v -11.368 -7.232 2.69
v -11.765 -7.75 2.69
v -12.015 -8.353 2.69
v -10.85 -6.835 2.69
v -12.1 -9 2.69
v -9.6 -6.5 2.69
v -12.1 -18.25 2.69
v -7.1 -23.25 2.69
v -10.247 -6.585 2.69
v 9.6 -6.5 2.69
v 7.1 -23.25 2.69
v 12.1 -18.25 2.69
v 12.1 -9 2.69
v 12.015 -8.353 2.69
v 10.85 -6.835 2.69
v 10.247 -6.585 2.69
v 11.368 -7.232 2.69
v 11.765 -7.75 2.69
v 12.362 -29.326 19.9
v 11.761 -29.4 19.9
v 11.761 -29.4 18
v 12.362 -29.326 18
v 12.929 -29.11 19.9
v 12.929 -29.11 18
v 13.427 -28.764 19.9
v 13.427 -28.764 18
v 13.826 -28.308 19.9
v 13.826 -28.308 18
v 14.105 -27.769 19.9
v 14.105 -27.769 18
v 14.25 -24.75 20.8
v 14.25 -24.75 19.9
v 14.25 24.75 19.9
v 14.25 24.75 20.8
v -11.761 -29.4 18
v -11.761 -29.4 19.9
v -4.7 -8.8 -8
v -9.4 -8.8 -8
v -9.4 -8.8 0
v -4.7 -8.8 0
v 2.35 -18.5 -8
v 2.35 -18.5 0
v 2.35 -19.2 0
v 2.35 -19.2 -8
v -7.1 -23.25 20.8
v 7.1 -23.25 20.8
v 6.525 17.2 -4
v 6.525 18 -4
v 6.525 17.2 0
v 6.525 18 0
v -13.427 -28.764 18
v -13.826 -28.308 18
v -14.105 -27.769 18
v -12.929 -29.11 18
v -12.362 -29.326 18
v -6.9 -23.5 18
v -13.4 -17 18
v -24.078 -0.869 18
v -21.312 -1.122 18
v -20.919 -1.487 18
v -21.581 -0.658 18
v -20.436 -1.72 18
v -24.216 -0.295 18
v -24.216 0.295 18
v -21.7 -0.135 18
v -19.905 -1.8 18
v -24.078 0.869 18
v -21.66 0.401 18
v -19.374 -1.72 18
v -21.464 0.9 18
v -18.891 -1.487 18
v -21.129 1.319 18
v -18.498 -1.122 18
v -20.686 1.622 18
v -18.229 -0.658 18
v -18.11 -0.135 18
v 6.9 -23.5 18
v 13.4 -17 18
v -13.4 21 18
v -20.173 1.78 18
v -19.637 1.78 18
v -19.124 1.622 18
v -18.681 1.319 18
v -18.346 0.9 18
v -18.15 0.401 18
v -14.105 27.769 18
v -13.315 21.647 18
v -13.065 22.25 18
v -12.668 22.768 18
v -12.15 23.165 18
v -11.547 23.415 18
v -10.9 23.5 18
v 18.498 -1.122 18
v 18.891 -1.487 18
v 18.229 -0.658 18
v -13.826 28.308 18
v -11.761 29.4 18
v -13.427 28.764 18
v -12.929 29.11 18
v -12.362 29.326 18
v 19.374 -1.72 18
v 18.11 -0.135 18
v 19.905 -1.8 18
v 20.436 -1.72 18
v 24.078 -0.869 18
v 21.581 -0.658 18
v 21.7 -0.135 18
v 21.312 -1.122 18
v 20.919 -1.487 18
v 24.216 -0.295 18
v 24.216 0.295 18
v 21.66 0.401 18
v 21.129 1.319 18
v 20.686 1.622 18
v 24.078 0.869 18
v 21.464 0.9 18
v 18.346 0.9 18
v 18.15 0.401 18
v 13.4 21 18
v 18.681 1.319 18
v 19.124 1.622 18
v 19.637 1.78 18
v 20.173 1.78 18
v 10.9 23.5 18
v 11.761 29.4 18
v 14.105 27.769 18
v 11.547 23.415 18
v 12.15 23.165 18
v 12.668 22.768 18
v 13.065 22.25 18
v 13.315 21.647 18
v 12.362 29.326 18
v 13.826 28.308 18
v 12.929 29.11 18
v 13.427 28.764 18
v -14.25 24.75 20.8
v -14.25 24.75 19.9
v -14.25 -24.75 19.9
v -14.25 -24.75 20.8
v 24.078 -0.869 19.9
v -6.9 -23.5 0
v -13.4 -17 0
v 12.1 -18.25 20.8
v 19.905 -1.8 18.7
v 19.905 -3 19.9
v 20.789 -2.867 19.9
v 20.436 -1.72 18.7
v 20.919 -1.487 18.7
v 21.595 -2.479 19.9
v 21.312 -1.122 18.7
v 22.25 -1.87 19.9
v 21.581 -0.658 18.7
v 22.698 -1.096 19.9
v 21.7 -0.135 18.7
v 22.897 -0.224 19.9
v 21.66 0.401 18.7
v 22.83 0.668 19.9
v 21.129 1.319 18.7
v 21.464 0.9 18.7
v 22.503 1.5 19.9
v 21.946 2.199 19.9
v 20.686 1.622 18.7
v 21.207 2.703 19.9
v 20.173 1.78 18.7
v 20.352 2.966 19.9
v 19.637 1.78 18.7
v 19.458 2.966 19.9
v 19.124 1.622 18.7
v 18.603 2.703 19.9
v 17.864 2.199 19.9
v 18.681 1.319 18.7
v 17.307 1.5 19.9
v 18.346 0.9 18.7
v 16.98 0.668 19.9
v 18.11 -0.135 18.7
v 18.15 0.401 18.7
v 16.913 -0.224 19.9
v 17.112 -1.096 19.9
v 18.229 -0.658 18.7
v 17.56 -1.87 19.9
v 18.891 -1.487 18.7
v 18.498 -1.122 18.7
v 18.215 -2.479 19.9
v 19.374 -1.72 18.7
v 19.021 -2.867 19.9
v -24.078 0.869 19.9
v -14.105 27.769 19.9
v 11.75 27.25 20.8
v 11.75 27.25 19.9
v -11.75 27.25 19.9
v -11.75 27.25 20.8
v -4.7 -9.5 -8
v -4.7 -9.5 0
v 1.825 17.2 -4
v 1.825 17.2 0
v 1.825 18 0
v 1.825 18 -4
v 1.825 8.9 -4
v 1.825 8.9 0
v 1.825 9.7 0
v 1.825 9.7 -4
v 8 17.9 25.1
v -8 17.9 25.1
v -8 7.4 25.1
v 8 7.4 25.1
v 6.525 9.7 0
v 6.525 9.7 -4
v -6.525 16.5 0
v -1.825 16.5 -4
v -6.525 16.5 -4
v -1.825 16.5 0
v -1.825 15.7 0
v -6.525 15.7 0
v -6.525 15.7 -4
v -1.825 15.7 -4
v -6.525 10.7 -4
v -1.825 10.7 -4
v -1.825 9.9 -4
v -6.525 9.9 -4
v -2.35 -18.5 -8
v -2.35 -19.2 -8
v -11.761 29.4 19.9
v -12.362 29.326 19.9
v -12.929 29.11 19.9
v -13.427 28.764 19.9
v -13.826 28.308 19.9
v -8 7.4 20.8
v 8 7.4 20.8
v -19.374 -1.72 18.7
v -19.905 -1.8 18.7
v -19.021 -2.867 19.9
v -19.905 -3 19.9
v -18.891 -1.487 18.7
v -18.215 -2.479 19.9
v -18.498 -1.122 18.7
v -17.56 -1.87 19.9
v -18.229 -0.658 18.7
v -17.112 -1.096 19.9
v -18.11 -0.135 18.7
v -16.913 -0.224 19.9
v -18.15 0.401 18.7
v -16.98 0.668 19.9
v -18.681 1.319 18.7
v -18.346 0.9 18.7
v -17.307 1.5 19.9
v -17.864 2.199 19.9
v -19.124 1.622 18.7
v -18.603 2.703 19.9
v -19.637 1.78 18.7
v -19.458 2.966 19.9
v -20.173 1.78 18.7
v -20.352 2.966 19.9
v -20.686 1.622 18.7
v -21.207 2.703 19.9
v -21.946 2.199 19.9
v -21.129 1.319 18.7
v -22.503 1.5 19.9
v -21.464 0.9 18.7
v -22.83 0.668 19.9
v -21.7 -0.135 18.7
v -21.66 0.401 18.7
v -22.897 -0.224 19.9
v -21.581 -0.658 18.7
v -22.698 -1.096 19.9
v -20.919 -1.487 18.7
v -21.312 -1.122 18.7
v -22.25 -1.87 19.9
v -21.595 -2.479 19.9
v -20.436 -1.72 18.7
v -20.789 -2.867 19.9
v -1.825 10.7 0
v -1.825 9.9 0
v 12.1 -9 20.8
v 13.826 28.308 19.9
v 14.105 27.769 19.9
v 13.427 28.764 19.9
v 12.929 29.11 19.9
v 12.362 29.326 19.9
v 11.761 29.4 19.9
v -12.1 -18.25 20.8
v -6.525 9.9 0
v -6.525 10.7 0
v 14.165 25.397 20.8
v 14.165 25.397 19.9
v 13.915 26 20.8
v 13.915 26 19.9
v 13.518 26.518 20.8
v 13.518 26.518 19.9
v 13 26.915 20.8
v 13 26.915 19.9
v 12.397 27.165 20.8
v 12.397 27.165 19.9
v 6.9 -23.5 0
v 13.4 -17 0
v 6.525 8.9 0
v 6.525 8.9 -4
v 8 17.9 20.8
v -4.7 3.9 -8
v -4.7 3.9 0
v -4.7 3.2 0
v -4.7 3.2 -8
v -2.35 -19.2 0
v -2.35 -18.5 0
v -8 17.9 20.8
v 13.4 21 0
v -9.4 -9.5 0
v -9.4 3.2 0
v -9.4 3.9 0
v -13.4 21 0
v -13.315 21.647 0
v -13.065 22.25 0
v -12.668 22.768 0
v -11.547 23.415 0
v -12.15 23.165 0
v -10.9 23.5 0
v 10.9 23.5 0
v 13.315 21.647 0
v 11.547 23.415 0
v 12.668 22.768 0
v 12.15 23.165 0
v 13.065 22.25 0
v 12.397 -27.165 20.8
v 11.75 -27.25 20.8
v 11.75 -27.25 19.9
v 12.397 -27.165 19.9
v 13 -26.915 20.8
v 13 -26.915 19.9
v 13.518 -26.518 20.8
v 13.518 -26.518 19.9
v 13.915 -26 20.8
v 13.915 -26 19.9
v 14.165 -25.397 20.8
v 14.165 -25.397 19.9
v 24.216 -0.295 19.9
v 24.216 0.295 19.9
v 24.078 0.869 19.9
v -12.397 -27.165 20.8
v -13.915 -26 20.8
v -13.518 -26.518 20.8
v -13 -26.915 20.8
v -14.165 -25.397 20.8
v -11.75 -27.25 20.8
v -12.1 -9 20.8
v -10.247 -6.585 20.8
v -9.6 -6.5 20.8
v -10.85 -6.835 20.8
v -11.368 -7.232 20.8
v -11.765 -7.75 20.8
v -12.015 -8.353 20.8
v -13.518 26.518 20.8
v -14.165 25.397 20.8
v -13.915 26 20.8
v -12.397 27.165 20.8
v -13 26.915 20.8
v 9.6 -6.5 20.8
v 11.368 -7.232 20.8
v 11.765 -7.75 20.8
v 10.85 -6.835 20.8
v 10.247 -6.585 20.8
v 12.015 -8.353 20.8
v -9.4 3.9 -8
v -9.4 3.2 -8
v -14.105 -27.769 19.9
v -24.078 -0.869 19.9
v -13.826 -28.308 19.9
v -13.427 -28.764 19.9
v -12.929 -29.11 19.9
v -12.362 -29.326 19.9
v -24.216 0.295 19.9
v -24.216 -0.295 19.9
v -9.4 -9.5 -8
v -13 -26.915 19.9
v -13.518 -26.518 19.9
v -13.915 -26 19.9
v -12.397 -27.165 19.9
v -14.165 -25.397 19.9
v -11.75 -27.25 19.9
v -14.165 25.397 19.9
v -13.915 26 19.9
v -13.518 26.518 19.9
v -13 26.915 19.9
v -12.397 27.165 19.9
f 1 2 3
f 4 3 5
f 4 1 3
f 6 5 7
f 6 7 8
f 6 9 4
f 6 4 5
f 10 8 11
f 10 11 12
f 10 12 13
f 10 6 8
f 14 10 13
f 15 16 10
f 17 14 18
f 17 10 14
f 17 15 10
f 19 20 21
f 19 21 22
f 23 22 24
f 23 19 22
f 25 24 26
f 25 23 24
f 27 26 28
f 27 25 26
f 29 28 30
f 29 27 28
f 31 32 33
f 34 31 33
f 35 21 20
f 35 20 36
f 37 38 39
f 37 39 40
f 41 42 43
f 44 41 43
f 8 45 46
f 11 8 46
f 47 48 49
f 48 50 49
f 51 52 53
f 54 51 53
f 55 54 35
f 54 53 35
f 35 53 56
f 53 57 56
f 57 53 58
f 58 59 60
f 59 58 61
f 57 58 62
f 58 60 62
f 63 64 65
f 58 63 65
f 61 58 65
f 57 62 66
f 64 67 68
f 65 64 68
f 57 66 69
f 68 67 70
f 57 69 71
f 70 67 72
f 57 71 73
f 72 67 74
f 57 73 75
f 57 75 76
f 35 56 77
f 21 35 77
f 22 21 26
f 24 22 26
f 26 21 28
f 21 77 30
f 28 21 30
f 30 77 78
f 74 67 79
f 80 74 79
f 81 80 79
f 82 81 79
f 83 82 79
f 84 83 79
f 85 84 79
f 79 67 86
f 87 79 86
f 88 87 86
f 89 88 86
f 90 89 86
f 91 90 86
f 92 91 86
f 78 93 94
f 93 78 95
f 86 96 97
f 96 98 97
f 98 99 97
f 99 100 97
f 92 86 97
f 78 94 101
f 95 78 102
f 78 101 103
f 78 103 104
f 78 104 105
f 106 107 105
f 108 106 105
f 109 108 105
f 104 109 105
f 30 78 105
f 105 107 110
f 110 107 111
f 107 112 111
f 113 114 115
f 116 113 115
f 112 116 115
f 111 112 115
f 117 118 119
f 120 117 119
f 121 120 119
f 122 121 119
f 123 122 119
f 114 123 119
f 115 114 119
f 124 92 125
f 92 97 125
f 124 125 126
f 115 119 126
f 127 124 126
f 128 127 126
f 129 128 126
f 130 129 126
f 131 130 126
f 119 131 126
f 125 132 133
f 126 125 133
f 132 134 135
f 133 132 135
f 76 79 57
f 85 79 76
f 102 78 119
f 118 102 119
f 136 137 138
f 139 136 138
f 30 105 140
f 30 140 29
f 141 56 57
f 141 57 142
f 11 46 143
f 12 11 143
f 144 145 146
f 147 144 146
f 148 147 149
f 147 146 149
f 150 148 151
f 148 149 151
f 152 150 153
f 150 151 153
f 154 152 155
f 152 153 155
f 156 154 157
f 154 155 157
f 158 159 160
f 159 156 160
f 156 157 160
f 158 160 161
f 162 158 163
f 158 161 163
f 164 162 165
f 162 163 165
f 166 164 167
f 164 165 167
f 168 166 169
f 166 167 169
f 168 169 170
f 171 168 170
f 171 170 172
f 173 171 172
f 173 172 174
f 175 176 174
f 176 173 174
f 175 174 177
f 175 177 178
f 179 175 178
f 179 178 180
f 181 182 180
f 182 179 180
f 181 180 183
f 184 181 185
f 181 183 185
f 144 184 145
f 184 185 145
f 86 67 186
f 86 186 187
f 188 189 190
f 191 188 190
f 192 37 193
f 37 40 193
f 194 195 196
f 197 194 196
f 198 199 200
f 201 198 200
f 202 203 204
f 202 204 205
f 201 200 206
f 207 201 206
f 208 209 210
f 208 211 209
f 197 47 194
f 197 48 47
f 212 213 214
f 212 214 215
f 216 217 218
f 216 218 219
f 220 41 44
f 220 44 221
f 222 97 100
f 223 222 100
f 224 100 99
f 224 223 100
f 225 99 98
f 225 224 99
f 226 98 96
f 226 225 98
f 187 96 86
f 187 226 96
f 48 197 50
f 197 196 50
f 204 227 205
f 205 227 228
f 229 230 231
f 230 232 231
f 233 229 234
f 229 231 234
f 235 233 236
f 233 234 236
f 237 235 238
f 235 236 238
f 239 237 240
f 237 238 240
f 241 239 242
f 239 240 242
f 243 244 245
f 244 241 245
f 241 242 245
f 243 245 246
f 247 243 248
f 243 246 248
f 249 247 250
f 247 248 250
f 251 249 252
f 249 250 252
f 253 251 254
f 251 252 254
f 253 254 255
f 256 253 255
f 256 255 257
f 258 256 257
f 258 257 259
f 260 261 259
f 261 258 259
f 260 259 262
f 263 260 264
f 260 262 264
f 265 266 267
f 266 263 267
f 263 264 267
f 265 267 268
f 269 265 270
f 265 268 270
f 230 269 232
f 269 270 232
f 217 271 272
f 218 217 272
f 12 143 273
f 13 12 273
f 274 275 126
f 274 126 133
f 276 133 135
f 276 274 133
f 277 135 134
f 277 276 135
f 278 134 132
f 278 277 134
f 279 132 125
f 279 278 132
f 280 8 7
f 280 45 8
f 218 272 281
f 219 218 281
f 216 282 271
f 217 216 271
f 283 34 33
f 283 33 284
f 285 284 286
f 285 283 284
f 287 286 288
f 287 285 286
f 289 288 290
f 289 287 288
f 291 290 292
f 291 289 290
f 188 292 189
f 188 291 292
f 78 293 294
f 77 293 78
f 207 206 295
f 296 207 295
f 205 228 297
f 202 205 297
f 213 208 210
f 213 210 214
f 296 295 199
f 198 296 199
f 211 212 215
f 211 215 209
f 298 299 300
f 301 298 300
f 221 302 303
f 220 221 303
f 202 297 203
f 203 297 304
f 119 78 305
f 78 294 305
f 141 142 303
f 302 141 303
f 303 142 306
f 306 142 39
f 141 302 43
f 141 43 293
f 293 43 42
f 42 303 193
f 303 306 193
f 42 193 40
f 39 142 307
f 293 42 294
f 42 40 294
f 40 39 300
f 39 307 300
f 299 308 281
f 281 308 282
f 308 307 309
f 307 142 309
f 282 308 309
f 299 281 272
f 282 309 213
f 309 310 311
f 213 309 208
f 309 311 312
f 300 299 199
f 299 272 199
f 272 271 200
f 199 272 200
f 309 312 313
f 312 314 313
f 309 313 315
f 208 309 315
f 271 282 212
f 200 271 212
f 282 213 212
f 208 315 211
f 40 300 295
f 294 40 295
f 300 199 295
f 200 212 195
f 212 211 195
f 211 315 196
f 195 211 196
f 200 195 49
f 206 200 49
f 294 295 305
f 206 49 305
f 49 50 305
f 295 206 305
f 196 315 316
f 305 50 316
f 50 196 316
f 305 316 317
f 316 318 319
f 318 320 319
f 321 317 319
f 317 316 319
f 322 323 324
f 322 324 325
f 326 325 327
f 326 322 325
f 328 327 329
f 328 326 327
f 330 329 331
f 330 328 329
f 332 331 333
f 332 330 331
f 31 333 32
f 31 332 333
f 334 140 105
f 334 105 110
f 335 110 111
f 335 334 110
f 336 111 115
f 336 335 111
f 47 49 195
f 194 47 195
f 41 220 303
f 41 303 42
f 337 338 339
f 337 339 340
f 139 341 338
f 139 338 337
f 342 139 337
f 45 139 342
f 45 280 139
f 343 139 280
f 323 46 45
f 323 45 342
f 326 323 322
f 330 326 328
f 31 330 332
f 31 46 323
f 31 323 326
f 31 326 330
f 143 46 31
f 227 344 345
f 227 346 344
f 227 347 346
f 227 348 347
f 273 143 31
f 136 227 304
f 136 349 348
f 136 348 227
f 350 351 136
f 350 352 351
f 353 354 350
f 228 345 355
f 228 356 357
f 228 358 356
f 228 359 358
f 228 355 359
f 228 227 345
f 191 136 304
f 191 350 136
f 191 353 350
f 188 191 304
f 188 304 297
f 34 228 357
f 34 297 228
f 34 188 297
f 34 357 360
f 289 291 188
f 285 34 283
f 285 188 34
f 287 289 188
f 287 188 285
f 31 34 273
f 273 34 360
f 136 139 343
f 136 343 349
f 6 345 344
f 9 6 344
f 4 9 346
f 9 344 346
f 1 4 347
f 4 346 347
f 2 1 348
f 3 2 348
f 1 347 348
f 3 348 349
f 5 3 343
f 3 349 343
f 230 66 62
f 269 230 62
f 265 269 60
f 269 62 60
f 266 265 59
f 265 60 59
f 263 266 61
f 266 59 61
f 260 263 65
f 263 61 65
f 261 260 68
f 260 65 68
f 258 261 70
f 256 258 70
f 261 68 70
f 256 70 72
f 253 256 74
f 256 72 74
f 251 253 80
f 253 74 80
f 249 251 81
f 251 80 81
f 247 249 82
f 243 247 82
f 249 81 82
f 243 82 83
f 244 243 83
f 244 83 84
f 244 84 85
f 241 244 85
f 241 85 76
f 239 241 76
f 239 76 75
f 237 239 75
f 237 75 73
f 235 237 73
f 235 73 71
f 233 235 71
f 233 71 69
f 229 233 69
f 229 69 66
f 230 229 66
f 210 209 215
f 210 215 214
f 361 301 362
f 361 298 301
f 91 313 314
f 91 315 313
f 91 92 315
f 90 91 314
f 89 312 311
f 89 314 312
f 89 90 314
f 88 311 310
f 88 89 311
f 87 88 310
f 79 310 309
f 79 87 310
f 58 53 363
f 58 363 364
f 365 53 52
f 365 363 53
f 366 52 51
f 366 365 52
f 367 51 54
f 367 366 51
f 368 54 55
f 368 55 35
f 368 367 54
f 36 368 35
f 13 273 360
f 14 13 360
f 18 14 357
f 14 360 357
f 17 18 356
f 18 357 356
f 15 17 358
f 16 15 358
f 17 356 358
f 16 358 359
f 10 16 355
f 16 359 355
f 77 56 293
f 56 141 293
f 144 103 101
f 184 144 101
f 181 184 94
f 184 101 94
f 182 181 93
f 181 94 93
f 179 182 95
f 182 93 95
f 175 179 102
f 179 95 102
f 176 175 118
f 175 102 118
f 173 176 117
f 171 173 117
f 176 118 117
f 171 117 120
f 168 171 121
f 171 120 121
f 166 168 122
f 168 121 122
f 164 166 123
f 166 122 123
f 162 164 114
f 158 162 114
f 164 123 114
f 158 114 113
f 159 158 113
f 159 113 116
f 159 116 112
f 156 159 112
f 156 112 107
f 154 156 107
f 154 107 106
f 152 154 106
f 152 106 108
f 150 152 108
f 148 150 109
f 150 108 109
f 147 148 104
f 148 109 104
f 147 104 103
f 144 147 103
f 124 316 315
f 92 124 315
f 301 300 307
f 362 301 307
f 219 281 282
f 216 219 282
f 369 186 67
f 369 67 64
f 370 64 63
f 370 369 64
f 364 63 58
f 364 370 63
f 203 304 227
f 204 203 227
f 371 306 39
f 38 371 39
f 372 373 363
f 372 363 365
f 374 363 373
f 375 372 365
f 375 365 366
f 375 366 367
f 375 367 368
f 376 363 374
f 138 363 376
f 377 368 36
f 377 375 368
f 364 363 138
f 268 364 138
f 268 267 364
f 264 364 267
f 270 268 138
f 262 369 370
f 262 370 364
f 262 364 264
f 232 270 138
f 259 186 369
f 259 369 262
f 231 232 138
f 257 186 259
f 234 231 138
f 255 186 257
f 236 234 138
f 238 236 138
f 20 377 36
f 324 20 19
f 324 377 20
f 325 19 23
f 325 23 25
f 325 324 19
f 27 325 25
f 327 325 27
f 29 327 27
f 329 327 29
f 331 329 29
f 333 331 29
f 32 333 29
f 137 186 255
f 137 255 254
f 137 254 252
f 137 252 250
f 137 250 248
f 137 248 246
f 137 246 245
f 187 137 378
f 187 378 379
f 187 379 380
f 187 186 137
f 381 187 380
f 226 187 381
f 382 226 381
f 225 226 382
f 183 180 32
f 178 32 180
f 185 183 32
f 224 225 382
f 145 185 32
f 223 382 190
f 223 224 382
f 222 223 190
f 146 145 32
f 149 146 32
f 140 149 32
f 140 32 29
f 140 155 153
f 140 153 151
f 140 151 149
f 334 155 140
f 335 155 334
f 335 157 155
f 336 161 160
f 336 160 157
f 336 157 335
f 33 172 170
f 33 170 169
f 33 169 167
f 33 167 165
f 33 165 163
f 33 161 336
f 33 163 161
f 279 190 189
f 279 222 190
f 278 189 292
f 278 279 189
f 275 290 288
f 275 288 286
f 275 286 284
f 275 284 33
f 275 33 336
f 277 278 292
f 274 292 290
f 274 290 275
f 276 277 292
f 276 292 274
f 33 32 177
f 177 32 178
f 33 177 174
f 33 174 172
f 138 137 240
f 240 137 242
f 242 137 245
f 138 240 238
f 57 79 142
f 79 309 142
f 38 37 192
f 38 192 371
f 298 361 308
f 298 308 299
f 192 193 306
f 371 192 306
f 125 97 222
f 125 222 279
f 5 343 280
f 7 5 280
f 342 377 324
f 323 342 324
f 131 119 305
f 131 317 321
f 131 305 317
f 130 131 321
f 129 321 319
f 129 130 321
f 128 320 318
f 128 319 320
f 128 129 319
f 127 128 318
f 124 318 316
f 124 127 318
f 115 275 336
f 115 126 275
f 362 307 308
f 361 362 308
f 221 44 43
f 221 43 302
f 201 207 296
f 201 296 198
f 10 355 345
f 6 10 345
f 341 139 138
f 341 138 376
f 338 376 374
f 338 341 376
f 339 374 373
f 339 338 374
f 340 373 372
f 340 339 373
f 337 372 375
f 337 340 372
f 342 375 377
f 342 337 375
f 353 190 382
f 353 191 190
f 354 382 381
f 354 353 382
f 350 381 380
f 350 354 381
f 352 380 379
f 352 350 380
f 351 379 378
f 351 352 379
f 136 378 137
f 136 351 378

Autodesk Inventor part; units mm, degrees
ref_plane "YZ Plane" through (0, 0, 0) normal (1, 0, 0) x (0, 1, 0)
ref_plane "XZ Plane" through (0, 0, 0) normal (0, 1, 0) x (-1, 0, 0)
ref_plane "XY Plane" through (0, 0, 0) normal (0, 0, 1) x (1, 0, 0)
sketch "Esquisse1" plane through (0, 0, 0) normal (0, 0, 1) x (1, 0, 0)
  line L0 (-13.4, -23.5) -> (13.4, -23.5)
  line L1 (13.4, -23.5) -> (13.4, 23.5)
  line L2 (13.4, 23.5) -> (-13.4, 23.5)
  line L3 (-13.4, 23.5) -> (-13.4, -23.5)
  line L4 (-13.4, -23.5) -> (13.4, 23.5) construction
  line L5 (13.4, -23.5) -> (-13.4, 23.5) construction
  point P0 (0, 0)
  dimension "d0" = 26.8
  dimension "d1" = 47
extrude "Extrusion1" add sketch "Esquisse1" along normal blind 18
chamfer "Chanfrein1" distance 6.5 angle 45 2 edges at (-13.4, -23.5, 9) (13.4, -23.5, 9)
sketch "Esquisse2" plane through (0, 0, 18) normal (0, 0, 1) x (1, 0, 0)
  line L0 (-24.4, 0) -> (-13.5, 29.4)
  line L1 (-13.5, 29.4) -> (13.5, 29.4)
  line L2 (13.5, 29.4) -> (24.4, 0)
  line L3 (24.4, 0) -> (13.5, -29.4)
  line L4 (13.5, -29.4) -> (-13.5, -29.4)
  line L5 (-13.5, -29.4) -> (-24.4, 0)
  point P0 (0, 0)
  point P1 (0, 29.4)
  point P2 (0, -29.4)
  dimension "d7" = 58.8
  dimension "d8" = 29.4
  dimension "d9" = 48.8
  dimension "d10" = 24.4
  dimension "d11" = 27
  dimension "d12" = 27
extrude "Extrusion2" add sketch "Esquisse2" along normal blind 1.9
sketch "Esquisse3" plane through (0, 0, 19.9) normal (0, 0, 1) x (1, 0, 0)
  line L0 (-14.25, -27.25) -> (14.25, -27.25)
  line L1 (14.25, -27.25) -> (14.25, 27.25)
  line L2 (14.25, 27.25) -> (-14.25, 27.25)
  line L3 (-14.25, 27.25) -> (-14.25, -27.25)
  point P0 (0, 0)
  point P1 (-14.25, 0)
  point P2 (0, 27.25)
  dimension "d15" = 28.5
  dimension "d16" = 54.5
extrude "Extrusion3" add sketch "Esquisse3" along normal blind 0.9
sketch "Esquisse4" plane through (0, 0, 20.8) normal (0, 0, 1) x (1, 0, 0)
  line L0 (-7.1, -23.25) -> (7.1, -23.25)
  line L1 (12.1, -18.25) -> (12.1, -9)
  line L2 (9.6, -6.5) -> (-9.6, -6.5)
  line L3 (-12.1, -9) -> (-12.1, -18.25)
  line L4 (-14.25, -27.25) -> (14.25, -27.25) projected
  line L5 (-7.1, -23.25) -> (-12.1, -18.25)
  line L6 (7.1, -23.25) -> (12.1, -18.25)
  arc A0 (-9.6, -6.5) -> (-12.1, -9) centre (-9.6, -9) ccw
  arc A1 (12.1, -9) -> (9.6, -6.5) centre (9.6, -9) ccw
  point P0 (0, 0)
  point P1 (-12.1, -23.25)
  point P2 (12.1, -23.25)
  point P3 (-12.1, -6.5)
  point P4 (0, -6.5)
  dimension "d19" = 24.2
  dimension "d20" = 16.75
  dimension "d21" = 4
  dimension "d22" = 5
  dimension "d23" = 5
  dimension "d24" = 5
  dimension "d25" = 5
  dimension "d26" = 2.5
extrude "Extrusion4" cut sketch "Esquisse4" against normal blind 18.11
sketch "Esquisse5" plane through (0, 0, 20.8) normal (0, 0, 1) x (1, 0, 0)
  line L0 (-8, 7.4) -> (8, 7.4)
  line L1 (8, 7.4) -> (8, 17.9)
  line L2 (8, 17.9) -> (-8, 17.9)
  line L3 (-8, 17.9) -> (-8, 7.4)
  line L4 (14.25, 27.25) -> (-14.25, 27.25) projected
  point P0 (0, 0)
  point P1 (0, 7.4)
  dimension "d29" = 16
  dimension "d30" = 10.5
  dimension "d31" = 9.35
extrude "Extrusion5" add sketch "Esquisse5" along normal blind 4.3
sketch "Esquisse6" plane through (0, 0, 0) normal (0, 0, -1) x (-1, 0, 0)
  line L0 (-2.35, -19.2) -> (2.35, -19.2)
  line L1 (2.35, -19.2) -> (2.35, -18.5)
  line L2 (2.35, -18.5) -> (-2.35, -18.5)
  line L3 (-2.35, -18.5) -> (-2.35, -19.2)
  line L4 (4.7, -9.5) -> (9.4, -9.5)
  line L5 (9.4, -9.5) -> (9.4, -8.8)
  line L6 (9.4, -8.8) -> (4.7, -8.8)
  line L7 (4.7, -8.8) -> (4.7, -9.5)
  line L8 (4.7, 3.2) -> (9.4, 3.2)
  line L9 (9.4, 3.2) -> (9.4, 3.9)
  line L10 (9.4, 3.9) -> (4.7, 3.9)
  line L11 (4.7, 3.9) -> (4.7, 3.2)
  line L12 (6.9, -23.5) -> (-6.9, -23.5) projected
  line L13 (13.4, 23.5) -> (13.4, -17) projected
  point P0 (0, 0)
  point P1 (0, -19.2)
  dimension "d34" = 4.7
  dimension "d35" = 0.7
  dimension "d38" = 0.7
  dimension "d40" = 0.7
  dimension "d41" = 4.3
  dimension "d42" = 14
  dimension "d43" = 12
  dimension "d44" = 4
  dimension "d45" = 4.7
extrude "Extrusion6" add sketch "Esquisse6" along normal blind 8
sketch "Esquisse7" plane through (0, 0, 0) normal (0, 0, -1) x (-1, 0, 0)
  line L0 (-6.525, 17.2) -> (-1.825, 17.2)
  line L1 (-1.825, 17.2) -> (-1.825, 18)
  line L2 (-1.825, 18) -> (-6.525, 18)
  line L3 (-6.525, 18) -> (-6.525, 17.2)
  line L4 (-6.525, 8.9) -> (-1.825, 8.9)
  line L5 (-1.825, 8.9) -> (-1.825, 9.7)
  line L6 (-1.825, 9.7) -> (-6.525, 9.7)
  line L7 (-6.525, 9.7) -> (-6.525, 8.9)
  line L8 (1.825, 16.5) -> (6.525, 16.5)
  line L9 (6.525, 16.5) -> (6.525, 15.7)
  line L10 (6.525, 15.7) -> (1.825, 15.7)
  line L11 (1.825, 15.7) -> (1.825, 16.5)
  line L12 (1.825, 9.9) -> (6.525, 9.9)
  line L13 (6.525, 9.9) -> (6.525, 10.7)
  line L14 (6.525, 10.7) -> (1.825, 10.7)
  line L15 (1.825, 10.7) -> (1.825, 9.9)
  line L16 (-13.4, 23.5) -> (13.4, 23.5) projected
  point P0 (0, 0)
  dimension "d48" = 4.7
  dimension "d49" = 4.7
  dimension "d50" = 0.8
  dimension "d51" = 0.8
  dimension "d52" = 0.8
  dimension "d53" = 0.8
  dimension "d54" = 7.5
  dimension "d55" = 5
  dimension "d56" = 3.65
  dimension "d57" = 1.825
  dimension "d58" = 5.5
  dimension "d60" = 1.5
extrude "Extrusion7" add sketch "Esquisse7" along normal blind 4
sketch "Esquisse8" plane through (0, 0, 19.9) normal (0, 0, 1) x (1, 0, 0)
  point P0 (0, 0)
  point P1 (-19.905, 0)
  point P2 (19.905, 0)
  dimension "d63" = 39.81
  dimension "d64" = 19.905
hole "Perçage1" at (-19.905, 0, 19.9) at (19.905, 0, 19.9) direction (0, 0, -1) diameter 3.6 end through all countersink diameter 6 countersink angle 90
fillet "Congé1" radius 2.5 12 edges at (-13.5, 29.4, 18.95) (-13.5, -29.4, 18.95) (13.5, -29.4, 18.95) (13.5, 29.4, 18.95) (24.4, 0, 18.95) (-24.4, 0, 18.95) (-14.25, 27.25, 20.35) (14.25, 27.25, 20.35) (-14.25, -27.25, 20.35) (14.25, -27.25, 20.35) (13.4, 23.5, 9) (-13.4, 23.5, 9)
equation "\"d8\" = 0.5 * d7"
equation "\"d10\" = 0.5 * d9"
equation "\"d12\" = d11"
equation "\"d23\" = d22"
equation "\"d24\" = d22"
equation "\"d25\" = d24"
equation "\"d38\" = d35"
equation "\"d40\" = d35"
equation "\"d45\" = d34"
equation "\"d49\" = d48"
equation "\"d51\" = d50"
equation "\"d52\" = d51"
equation "\"d53\" = d52"
equation "\"d57\" = 0.5 * d56"
equation "\"d64\" = 0.5 * d63"
equation "\"pi\" = 3.141593"
equation "\"nombredor\" = 1.61803"
properties part number "Plug+prise" material "Plastique ABS"
